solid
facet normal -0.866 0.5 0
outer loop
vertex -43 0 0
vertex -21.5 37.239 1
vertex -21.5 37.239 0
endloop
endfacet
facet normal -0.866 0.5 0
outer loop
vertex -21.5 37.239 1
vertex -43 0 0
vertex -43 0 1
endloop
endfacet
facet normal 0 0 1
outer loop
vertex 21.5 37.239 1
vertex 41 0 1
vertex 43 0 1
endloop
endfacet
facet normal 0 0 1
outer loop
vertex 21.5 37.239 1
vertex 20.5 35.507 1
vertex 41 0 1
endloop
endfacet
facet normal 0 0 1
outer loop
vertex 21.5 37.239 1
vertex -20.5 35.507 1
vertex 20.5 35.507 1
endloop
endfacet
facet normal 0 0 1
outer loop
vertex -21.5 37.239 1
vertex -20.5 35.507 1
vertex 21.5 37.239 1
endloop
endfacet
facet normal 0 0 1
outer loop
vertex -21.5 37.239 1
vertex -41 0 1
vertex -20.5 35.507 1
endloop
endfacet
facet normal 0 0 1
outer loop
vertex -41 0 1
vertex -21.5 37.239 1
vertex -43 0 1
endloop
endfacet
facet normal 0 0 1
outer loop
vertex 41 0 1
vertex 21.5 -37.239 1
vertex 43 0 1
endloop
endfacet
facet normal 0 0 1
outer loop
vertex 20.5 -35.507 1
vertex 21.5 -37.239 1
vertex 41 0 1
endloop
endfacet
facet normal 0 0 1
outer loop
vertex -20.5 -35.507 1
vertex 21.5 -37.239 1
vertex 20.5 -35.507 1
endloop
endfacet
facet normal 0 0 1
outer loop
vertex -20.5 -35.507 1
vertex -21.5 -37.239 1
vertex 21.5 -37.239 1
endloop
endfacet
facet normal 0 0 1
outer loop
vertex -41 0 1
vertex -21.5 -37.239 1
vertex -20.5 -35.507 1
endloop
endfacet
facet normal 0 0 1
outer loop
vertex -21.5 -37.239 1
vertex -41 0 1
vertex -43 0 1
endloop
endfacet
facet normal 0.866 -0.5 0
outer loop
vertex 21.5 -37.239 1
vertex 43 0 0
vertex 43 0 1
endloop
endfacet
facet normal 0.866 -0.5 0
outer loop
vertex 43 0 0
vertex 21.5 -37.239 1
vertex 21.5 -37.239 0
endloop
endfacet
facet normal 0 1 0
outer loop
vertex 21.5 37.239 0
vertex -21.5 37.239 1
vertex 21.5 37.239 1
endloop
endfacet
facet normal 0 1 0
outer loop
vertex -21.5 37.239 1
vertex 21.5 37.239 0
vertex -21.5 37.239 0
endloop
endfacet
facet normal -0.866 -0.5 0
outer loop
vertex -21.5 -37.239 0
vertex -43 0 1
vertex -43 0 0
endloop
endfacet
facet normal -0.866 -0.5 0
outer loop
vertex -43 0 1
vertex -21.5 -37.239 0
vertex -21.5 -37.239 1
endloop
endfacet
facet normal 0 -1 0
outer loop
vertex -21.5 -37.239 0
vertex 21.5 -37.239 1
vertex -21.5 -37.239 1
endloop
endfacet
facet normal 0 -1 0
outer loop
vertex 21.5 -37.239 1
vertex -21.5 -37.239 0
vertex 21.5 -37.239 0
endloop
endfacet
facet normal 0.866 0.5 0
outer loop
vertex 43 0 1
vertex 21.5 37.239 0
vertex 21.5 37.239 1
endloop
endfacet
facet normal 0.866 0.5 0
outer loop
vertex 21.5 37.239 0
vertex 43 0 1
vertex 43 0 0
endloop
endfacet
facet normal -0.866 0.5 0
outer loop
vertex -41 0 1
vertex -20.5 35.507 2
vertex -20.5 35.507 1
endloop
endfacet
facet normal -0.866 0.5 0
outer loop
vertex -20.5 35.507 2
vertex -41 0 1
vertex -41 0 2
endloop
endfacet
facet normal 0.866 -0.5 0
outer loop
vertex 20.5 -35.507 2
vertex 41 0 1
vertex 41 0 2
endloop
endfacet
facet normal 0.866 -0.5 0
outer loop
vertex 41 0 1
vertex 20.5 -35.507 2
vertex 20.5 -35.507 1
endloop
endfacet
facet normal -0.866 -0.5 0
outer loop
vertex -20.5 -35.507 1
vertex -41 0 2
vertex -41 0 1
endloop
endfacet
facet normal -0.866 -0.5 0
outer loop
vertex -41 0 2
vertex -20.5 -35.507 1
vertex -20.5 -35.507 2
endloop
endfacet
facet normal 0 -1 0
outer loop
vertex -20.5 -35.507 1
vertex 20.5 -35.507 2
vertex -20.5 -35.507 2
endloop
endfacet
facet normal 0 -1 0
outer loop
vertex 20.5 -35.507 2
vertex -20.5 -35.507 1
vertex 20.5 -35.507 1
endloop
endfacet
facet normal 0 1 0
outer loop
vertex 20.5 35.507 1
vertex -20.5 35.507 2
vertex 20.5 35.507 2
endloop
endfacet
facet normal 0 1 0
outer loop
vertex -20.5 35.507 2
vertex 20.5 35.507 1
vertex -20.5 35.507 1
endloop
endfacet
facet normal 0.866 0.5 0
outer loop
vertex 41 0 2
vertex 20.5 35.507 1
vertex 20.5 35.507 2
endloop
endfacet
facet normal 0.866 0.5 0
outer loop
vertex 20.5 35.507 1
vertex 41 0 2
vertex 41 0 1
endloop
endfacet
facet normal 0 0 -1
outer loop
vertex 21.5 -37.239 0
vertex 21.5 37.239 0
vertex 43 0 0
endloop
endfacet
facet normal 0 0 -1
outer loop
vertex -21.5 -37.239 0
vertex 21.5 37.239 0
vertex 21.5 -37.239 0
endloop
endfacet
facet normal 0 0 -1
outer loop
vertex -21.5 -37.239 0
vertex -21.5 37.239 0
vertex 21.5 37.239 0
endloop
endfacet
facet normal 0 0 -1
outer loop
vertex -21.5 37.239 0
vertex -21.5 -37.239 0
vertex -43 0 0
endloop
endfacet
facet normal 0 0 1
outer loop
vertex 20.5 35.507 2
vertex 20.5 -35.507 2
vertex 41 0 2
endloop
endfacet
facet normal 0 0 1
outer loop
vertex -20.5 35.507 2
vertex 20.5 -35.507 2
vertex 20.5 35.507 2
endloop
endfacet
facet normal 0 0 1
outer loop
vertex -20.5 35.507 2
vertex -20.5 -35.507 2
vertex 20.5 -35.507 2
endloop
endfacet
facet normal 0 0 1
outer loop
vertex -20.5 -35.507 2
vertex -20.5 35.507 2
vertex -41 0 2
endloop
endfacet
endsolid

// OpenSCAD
// file: cololight_tribute_header.scad
/* 
Cololight like hexagon lights
*/

/* 
variable definitions
*/

hex_height=25;
hex_lon_d=86;
hex_short_d=74.478;
hex_incir_rad=43;
hex_lip_depth=1;
diffuser_thickness=2;
diffuser_lip_width=0;
diffuser_edge_thickness=1;
diffuser_clip_thickness=4;
diffuser_clip_wall_thickness=1;
base_thickness=1;
edge_thickness=2;
pin_header_width=8;
pin_header_height=2.5;
clip_mouth_width=12;
clip_mouth_length=6.5;
clip_edge_offset=4.3;

clip_width=12;
clip_length=(2*clip_mouth_length)+(2*edge_thickness);
clip_height=8+base_thickness;
// main file
include <cololight_tribute_header.scad>

/*
diffuser definition
*/

group() {
    difference() {
    
        color("green")
        linear_extrude(height = diffuser_thickness, center = false, convexity = 10, twist = 0){
            circle(r=hex_incir_rad, $fn=6);
        }
    
    /* 
    diffuser cutting tool definition
    */
        
    translate([0,0,diffuser_edge_thickness]){
        group(){
          
            difference(){
                color("blue")
                linear_extrude(height = diffuser_thickness*2, center = false, convexity = 10, twist = 0){
                    circle(r=hex_incir_rad, $fn=6);
                }
                color("red")
                linear_extrude(height = diffuser_thickness*2, center = false, convexity = 10, twist = 0){
                    circle(r=hex_incir_rad-(edge_thickness-diffuser_lip_width), $fn=6);
                }
            }
        }
    }   
      
    
    }
}
